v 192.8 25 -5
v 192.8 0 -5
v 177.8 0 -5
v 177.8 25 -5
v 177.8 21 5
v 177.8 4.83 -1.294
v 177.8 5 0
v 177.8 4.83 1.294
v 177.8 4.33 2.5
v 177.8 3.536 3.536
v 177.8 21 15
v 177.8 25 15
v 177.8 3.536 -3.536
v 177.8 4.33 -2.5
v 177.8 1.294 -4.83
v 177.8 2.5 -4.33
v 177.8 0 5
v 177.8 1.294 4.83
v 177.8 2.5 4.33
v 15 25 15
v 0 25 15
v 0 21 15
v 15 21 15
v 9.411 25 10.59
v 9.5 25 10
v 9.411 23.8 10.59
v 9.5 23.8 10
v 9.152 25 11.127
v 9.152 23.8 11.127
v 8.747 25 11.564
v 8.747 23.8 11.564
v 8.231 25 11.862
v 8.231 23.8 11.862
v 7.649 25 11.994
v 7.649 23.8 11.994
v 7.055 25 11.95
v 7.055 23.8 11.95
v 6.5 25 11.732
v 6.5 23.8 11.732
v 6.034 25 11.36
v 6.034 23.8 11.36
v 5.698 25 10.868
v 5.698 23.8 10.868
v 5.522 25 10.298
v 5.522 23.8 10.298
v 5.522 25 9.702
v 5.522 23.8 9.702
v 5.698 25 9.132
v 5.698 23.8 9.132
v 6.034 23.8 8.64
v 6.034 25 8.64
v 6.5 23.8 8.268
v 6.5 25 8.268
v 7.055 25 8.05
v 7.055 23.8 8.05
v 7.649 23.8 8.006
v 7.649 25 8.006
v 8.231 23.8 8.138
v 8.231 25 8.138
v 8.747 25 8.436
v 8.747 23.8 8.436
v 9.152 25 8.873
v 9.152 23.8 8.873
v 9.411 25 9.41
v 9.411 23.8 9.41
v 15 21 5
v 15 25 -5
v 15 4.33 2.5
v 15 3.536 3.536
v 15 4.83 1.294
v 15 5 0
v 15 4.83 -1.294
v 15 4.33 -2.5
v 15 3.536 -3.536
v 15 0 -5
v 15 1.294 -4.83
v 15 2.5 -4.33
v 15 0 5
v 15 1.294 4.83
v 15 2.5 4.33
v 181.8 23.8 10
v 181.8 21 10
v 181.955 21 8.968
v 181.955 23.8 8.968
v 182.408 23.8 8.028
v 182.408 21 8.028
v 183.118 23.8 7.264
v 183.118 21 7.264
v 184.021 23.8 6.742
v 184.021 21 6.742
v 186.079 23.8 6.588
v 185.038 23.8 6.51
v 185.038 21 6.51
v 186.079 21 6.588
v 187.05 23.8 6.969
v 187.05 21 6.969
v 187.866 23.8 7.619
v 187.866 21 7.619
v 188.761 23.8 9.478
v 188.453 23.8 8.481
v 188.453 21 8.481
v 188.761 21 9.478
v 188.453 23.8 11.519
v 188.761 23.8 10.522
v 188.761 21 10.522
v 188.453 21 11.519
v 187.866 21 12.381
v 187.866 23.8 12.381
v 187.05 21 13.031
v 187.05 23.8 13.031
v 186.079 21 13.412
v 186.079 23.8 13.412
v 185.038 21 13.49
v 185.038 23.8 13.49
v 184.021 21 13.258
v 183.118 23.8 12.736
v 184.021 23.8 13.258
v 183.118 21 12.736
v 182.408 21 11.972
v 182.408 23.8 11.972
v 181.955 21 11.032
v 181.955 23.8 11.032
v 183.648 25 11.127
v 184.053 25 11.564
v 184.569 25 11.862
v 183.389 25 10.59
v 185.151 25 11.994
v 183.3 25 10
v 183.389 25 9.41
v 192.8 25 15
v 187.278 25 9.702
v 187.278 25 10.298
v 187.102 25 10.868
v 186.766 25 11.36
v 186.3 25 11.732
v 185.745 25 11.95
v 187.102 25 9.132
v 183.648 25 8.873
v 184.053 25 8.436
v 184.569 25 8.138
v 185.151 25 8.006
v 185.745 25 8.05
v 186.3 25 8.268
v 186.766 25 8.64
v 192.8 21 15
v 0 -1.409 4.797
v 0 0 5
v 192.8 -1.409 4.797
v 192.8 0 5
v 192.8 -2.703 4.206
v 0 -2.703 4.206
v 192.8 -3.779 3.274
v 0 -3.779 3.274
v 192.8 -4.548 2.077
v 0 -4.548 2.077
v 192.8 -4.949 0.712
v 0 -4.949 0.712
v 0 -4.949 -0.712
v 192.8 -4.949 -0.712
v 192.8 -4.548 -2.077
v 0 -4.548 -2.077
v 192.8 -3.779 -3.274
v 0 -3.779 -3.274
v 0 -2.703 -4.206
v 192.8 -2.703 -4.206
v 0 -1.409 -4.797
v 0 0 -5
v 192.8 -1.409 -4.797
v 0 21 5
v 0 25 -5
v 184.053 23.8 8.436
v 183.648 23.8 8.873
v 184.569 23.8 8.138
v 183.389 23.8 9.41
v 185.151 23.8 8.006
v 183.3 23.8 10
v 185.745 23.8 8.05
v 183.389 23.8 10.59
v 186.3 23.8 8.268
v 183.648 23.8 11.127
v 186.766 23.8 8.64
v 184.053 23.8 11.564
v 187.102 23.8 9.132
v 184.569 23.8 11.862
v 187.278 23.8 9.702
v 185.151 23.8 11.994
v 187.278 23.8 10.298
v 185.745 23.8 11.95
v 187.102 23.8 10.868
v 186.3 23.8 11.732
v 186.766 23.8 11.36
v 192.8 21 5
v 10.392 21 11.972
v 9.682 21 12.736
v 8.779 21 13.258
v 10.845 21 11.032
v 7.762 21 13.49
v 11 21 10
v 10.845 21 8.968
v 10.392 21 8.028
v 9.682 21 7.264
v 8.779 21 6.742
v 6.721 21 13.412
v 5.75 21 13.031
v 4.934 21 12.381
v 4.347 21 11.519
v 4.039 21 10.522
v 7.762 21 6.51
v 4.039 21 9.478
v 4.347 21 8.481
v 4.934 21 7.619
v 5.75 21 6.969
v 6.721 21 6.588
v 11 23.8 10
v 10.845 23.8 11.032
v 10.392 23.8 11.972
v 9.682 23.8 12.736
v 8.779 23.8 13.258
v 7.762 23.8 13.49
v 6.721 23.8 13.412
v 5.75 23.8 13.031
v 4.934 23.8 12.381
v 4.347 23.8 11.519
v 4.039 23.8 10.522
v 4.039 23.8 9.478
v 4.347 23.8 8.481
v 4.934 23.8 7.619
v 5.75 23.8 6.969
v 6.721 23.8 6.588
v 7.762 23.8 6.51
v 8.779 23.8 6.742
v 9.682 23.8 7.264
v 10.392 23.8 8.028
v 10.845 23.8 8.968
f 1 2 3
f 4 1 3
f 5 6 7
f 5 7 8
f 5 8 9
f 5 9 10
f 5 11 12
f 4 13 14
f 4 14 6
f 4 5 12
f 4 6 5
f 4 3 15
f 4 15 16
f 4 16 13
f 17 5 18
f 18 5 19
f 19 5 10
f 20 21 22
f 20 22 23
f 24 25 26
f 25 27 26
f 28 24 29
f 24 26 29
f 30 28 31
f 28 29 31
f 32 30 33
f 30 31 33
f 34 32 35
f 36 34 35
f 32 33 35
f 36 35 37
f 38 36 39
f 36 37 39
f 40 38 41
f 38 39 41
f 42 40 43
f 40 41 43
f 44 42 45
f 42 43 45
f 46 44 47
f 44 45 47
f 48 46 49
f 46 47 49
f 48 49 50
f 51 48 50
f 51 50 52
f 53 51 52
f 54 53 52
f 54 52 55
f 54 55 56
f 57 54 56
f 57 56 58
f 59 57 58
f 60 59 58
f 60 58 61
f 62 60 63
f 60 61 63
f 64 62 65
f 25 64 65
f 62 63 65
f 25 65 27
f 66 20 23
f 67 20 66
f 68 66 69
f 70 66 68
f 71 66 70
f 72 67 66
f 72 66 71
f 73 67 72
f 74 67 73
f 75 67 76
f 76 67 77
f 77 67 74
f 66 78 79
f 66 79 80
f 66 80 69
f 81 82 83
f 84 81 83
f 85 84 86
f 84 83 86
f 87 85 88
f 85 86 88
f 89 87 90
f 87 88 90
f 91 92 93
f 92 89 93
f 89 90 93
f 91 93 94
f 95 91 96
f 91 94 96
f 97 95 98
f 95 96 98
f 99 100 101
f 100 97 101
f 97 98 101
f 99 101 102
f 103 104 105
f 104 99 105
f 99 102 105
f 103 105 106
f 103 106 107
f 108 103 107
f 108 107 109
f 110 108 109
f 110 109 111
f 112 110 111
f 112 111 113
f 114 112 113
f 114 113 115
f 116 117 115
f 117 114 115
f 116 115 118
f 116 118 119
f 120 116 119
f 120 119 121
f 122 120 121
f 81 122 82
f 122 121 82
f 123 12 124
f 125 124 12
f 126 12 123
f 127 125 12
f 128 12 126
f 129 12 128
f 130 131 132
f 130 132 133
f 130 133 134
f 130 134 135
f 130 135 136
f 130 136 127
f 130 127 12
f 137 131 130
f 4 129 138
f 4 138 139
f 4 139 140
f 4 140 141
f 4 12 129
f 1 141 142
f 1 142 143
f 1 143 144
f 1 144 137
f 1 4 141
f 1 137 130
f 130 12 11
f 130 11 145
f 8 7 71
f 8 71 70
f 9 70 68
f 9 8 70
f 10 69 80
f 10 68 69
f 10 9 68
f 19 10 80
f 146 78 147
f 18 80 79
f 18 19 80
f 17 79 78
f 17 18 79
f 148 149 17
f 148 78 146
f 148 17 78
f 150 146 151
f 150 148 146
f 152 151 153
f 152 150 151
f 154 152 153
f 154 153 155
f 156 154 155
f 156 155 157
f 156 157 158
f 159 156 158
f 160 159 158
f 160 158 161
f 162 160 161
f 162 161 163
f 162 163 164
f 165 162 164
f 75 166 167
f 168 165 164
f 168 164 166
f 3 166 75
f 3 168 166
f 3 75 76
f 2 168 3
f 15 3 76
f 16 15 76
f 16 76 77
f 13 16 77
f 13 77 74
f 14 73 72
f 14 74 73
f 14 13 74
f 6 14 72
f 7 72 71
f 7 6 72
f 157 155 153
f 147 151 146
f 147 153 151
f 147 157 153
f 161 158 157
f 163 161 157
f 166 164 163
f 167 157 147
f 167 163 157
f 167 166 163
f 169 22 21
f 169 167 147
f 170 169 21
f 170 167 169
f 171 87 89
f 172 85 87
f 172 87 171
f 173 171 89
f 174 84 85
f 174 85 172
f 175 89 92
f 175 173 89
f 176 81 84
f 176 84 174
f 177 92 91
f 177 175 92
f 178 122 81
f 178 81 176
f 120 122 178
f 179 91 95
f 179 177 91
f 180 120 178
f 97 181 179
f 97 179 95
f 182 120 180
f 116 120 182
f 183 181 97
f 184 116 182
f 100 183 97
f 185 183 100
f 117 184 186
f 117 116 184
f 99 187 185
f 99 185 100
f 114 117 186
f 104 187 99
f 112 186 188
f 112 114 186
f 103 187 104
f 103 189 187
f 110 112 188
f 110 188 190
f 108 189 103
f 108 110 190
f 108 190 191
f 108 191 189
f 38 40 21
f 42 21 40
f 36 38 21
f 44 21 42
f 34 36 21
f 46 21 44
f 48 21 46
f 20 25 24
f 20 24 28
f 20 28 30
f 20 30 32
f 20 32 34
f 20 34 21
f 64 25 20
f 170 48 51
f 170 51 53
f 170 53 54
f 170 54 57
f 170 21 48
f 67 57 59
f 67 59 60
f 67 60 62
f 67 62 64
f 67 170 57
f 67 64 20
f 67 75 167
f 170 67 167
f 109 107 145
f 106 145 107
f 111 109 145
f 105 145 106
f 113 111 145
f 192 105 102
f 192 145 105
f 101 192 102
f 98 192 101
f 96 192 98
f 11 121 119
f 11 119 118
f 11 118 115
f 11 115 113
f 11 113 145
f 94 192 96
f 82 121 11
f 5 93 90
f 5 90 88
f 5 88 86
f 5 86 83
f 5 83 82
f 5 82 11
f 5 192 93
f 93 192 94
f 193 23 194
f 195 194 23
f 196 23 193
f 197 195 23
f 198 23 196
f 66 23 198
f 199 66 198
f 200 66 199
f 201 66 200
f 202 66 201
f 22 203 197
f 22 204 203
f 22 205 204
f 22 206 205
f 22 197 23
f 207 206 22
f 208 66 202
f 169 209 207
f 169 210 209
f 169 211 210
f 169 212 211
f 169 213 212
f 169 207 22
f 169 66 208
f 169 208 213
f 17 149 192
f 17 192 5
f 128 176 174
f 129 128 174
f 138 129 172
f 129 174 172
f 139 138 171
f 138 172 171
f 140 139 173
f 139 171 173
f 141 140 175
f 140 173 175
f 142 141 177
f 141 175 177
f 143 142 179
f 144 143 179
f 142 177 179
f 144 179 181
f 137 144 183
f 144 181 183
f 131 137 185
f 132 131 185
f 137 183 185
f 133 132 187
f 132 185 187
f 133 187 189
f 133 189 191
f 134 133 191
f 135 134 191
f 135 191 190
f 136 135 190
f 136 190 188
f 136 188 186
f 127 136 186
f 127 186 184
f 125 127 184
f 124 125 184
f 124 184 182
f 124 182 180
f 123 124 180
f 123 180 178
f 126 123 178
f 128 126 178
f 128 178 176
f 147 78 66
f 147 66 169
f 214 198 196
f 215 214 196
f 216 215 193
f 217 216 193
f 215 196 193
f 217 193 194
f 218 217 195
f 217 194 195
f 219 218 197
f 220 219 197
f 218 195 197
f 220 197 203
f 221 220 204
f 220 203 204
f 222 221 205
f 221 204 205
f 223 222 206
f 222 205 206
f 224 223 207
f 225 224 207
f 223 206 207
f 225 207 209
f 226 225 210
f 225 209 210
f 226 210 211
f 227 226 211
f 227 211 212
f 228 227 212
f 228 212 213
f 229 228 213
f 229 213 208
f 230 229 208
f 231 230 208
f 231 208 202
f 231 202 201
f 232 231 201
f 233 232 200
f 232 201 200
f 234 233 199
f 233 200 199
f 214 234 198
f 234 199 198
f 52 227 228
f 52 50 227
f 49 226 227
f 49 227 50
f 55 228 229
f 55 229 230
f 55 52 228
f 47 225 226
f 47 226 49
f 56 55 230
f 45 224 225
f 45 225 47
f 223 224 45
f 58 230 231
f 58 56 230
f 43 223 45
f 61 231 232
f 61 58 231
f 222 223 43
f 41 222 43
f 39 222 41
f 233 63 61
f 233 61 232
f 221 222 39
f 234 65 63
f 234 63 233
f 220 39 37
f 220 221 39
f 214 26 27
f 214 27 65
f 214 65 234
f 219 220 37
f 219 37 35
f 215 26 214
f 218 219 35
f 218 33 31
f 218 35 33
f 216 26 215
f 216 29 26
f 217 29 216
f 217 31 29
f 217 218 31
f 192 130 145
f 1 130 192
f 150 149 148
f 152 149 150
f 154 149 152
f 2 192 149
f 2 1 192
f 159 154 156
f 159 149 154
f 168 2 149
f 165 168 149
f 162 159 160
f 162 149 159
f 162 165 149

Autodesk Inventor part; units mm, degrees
ref_plane "YZ Plane" through (0, 0, 0) normal (1, 0, 0) x (0, 1, 0)
ref_plane "XZ Plane" through (0, 0, 0) normal (0, 1, 0) x (-1, 0, 0)
ref_plane "XY Plane" through (0, 0, 0) normal (0, 0, 1) x (1, 0, 0)
sketch "Sketch1" plane through (0, 0, 0) normal (0, 0, 1) x (1, 0, 0)
  point P0 (0, 0)
sketch "Sketch2" plane through (0, 0, 0) normal (1, 0, 0) x (0, 1, 0)
  circle A0 centre (0, 0) radius 5
  dimension "d0" = 10
extrude "Extrusion1" add sketch "Sketch2" along normal blind 96.4
sketch "Sketch3" plane through (0, 0, 0) normal (-1, 0, 0) x (0, 0, 1)
  circle A0 centre (0, 0) radius 5 projected
  line L0 (-5, 0) -> (5, 0)
  arc A1 (5, 0) -> (-5, 0) centre (0, 0) ccw
  dimension "d3" = 5
extrude "Extrusion2" cut sketch "Sketch3" against normal blind 15 contours L0 A0 picked at (1.2475, 1.1052)
sketch "Sketch4" plane through (0, 0, 5) normal (0, 1, 0) x (1, 0, 0)
  line L0 (15, 0) -> (0, 0) projected
  line L1 (15, 0) -> (15, 10) projected
  line L2 (0, 0) -> (15, 0)
  line L3 (15, 0) -> (15, 10)
  line L4 (15, 10) -> (0, 10)
  line L5 (0, 10) -> (0, 0)
  point P0 (0, 5)
extrude "Extrusion3" add sketch "Sketch4" along normal blind 25
sketch "Sketch5" plane through (0, 0, 5) normal (0, 0, 1) x (1, 0, 0)
  line L0 (0, 0) -> (0, 25) projected
  line L1 (0, 25) -> (15, 25)
  line L2 (15, 25) -> (15, 21)
  line L3 (15, 21) -> (0, 21)
  line L4 (0, 21) -> (0, 25)
  point P0 (0, 21)
  dimension "d8" = 4
  dimension "d9" = 15
extrude "Extrusion4" add sketch "Sketch5" along normal blind 10
sketch "Sketch6" plane through (0, 21, 5) normal (0, -1, 0) x (1, 0, 0)
  circle A0 centre (7.5, 5) radius 3.5
  line L0 (0, 0) -> (0, 10) projected
  line L1 (15, 0) -> (0, 0) projected
  point P0 (0, -5)
  dimension "d12" = 7
  dimension "d13" = 7.5
  dimension "d14" = 5
extrude "Extrusion5" cut sketch "Sketch6" against normal blind 2.8
sketch "Sketch7" plane through (7.5, 23.8, 10) normal (0, -1, 0) x (1, 0, 0)
  circle A0 centre (0, 0) radius 2
  line L0 (-7.5, -5) -> (-7.5, 5) projected
  line L1 (7.5, -5) -> (-7.5, -5) projected
  point P0 (-7.5, -10)
  dimension "d17" = 7.5
  dimension "d18" = 5
  dimension "d19" = 4
extrude "Extrusion6" cut sketch "Sketch7" against normal through all
mirror "Mirror1" about plane through (96.4, 0, 0) normal (1, 0, 0) of "Extrusion5", "Extrusion6", "Extrusion4", "Extrusion3", "Extrusion1"
properties part number "Supporting-Rod"
